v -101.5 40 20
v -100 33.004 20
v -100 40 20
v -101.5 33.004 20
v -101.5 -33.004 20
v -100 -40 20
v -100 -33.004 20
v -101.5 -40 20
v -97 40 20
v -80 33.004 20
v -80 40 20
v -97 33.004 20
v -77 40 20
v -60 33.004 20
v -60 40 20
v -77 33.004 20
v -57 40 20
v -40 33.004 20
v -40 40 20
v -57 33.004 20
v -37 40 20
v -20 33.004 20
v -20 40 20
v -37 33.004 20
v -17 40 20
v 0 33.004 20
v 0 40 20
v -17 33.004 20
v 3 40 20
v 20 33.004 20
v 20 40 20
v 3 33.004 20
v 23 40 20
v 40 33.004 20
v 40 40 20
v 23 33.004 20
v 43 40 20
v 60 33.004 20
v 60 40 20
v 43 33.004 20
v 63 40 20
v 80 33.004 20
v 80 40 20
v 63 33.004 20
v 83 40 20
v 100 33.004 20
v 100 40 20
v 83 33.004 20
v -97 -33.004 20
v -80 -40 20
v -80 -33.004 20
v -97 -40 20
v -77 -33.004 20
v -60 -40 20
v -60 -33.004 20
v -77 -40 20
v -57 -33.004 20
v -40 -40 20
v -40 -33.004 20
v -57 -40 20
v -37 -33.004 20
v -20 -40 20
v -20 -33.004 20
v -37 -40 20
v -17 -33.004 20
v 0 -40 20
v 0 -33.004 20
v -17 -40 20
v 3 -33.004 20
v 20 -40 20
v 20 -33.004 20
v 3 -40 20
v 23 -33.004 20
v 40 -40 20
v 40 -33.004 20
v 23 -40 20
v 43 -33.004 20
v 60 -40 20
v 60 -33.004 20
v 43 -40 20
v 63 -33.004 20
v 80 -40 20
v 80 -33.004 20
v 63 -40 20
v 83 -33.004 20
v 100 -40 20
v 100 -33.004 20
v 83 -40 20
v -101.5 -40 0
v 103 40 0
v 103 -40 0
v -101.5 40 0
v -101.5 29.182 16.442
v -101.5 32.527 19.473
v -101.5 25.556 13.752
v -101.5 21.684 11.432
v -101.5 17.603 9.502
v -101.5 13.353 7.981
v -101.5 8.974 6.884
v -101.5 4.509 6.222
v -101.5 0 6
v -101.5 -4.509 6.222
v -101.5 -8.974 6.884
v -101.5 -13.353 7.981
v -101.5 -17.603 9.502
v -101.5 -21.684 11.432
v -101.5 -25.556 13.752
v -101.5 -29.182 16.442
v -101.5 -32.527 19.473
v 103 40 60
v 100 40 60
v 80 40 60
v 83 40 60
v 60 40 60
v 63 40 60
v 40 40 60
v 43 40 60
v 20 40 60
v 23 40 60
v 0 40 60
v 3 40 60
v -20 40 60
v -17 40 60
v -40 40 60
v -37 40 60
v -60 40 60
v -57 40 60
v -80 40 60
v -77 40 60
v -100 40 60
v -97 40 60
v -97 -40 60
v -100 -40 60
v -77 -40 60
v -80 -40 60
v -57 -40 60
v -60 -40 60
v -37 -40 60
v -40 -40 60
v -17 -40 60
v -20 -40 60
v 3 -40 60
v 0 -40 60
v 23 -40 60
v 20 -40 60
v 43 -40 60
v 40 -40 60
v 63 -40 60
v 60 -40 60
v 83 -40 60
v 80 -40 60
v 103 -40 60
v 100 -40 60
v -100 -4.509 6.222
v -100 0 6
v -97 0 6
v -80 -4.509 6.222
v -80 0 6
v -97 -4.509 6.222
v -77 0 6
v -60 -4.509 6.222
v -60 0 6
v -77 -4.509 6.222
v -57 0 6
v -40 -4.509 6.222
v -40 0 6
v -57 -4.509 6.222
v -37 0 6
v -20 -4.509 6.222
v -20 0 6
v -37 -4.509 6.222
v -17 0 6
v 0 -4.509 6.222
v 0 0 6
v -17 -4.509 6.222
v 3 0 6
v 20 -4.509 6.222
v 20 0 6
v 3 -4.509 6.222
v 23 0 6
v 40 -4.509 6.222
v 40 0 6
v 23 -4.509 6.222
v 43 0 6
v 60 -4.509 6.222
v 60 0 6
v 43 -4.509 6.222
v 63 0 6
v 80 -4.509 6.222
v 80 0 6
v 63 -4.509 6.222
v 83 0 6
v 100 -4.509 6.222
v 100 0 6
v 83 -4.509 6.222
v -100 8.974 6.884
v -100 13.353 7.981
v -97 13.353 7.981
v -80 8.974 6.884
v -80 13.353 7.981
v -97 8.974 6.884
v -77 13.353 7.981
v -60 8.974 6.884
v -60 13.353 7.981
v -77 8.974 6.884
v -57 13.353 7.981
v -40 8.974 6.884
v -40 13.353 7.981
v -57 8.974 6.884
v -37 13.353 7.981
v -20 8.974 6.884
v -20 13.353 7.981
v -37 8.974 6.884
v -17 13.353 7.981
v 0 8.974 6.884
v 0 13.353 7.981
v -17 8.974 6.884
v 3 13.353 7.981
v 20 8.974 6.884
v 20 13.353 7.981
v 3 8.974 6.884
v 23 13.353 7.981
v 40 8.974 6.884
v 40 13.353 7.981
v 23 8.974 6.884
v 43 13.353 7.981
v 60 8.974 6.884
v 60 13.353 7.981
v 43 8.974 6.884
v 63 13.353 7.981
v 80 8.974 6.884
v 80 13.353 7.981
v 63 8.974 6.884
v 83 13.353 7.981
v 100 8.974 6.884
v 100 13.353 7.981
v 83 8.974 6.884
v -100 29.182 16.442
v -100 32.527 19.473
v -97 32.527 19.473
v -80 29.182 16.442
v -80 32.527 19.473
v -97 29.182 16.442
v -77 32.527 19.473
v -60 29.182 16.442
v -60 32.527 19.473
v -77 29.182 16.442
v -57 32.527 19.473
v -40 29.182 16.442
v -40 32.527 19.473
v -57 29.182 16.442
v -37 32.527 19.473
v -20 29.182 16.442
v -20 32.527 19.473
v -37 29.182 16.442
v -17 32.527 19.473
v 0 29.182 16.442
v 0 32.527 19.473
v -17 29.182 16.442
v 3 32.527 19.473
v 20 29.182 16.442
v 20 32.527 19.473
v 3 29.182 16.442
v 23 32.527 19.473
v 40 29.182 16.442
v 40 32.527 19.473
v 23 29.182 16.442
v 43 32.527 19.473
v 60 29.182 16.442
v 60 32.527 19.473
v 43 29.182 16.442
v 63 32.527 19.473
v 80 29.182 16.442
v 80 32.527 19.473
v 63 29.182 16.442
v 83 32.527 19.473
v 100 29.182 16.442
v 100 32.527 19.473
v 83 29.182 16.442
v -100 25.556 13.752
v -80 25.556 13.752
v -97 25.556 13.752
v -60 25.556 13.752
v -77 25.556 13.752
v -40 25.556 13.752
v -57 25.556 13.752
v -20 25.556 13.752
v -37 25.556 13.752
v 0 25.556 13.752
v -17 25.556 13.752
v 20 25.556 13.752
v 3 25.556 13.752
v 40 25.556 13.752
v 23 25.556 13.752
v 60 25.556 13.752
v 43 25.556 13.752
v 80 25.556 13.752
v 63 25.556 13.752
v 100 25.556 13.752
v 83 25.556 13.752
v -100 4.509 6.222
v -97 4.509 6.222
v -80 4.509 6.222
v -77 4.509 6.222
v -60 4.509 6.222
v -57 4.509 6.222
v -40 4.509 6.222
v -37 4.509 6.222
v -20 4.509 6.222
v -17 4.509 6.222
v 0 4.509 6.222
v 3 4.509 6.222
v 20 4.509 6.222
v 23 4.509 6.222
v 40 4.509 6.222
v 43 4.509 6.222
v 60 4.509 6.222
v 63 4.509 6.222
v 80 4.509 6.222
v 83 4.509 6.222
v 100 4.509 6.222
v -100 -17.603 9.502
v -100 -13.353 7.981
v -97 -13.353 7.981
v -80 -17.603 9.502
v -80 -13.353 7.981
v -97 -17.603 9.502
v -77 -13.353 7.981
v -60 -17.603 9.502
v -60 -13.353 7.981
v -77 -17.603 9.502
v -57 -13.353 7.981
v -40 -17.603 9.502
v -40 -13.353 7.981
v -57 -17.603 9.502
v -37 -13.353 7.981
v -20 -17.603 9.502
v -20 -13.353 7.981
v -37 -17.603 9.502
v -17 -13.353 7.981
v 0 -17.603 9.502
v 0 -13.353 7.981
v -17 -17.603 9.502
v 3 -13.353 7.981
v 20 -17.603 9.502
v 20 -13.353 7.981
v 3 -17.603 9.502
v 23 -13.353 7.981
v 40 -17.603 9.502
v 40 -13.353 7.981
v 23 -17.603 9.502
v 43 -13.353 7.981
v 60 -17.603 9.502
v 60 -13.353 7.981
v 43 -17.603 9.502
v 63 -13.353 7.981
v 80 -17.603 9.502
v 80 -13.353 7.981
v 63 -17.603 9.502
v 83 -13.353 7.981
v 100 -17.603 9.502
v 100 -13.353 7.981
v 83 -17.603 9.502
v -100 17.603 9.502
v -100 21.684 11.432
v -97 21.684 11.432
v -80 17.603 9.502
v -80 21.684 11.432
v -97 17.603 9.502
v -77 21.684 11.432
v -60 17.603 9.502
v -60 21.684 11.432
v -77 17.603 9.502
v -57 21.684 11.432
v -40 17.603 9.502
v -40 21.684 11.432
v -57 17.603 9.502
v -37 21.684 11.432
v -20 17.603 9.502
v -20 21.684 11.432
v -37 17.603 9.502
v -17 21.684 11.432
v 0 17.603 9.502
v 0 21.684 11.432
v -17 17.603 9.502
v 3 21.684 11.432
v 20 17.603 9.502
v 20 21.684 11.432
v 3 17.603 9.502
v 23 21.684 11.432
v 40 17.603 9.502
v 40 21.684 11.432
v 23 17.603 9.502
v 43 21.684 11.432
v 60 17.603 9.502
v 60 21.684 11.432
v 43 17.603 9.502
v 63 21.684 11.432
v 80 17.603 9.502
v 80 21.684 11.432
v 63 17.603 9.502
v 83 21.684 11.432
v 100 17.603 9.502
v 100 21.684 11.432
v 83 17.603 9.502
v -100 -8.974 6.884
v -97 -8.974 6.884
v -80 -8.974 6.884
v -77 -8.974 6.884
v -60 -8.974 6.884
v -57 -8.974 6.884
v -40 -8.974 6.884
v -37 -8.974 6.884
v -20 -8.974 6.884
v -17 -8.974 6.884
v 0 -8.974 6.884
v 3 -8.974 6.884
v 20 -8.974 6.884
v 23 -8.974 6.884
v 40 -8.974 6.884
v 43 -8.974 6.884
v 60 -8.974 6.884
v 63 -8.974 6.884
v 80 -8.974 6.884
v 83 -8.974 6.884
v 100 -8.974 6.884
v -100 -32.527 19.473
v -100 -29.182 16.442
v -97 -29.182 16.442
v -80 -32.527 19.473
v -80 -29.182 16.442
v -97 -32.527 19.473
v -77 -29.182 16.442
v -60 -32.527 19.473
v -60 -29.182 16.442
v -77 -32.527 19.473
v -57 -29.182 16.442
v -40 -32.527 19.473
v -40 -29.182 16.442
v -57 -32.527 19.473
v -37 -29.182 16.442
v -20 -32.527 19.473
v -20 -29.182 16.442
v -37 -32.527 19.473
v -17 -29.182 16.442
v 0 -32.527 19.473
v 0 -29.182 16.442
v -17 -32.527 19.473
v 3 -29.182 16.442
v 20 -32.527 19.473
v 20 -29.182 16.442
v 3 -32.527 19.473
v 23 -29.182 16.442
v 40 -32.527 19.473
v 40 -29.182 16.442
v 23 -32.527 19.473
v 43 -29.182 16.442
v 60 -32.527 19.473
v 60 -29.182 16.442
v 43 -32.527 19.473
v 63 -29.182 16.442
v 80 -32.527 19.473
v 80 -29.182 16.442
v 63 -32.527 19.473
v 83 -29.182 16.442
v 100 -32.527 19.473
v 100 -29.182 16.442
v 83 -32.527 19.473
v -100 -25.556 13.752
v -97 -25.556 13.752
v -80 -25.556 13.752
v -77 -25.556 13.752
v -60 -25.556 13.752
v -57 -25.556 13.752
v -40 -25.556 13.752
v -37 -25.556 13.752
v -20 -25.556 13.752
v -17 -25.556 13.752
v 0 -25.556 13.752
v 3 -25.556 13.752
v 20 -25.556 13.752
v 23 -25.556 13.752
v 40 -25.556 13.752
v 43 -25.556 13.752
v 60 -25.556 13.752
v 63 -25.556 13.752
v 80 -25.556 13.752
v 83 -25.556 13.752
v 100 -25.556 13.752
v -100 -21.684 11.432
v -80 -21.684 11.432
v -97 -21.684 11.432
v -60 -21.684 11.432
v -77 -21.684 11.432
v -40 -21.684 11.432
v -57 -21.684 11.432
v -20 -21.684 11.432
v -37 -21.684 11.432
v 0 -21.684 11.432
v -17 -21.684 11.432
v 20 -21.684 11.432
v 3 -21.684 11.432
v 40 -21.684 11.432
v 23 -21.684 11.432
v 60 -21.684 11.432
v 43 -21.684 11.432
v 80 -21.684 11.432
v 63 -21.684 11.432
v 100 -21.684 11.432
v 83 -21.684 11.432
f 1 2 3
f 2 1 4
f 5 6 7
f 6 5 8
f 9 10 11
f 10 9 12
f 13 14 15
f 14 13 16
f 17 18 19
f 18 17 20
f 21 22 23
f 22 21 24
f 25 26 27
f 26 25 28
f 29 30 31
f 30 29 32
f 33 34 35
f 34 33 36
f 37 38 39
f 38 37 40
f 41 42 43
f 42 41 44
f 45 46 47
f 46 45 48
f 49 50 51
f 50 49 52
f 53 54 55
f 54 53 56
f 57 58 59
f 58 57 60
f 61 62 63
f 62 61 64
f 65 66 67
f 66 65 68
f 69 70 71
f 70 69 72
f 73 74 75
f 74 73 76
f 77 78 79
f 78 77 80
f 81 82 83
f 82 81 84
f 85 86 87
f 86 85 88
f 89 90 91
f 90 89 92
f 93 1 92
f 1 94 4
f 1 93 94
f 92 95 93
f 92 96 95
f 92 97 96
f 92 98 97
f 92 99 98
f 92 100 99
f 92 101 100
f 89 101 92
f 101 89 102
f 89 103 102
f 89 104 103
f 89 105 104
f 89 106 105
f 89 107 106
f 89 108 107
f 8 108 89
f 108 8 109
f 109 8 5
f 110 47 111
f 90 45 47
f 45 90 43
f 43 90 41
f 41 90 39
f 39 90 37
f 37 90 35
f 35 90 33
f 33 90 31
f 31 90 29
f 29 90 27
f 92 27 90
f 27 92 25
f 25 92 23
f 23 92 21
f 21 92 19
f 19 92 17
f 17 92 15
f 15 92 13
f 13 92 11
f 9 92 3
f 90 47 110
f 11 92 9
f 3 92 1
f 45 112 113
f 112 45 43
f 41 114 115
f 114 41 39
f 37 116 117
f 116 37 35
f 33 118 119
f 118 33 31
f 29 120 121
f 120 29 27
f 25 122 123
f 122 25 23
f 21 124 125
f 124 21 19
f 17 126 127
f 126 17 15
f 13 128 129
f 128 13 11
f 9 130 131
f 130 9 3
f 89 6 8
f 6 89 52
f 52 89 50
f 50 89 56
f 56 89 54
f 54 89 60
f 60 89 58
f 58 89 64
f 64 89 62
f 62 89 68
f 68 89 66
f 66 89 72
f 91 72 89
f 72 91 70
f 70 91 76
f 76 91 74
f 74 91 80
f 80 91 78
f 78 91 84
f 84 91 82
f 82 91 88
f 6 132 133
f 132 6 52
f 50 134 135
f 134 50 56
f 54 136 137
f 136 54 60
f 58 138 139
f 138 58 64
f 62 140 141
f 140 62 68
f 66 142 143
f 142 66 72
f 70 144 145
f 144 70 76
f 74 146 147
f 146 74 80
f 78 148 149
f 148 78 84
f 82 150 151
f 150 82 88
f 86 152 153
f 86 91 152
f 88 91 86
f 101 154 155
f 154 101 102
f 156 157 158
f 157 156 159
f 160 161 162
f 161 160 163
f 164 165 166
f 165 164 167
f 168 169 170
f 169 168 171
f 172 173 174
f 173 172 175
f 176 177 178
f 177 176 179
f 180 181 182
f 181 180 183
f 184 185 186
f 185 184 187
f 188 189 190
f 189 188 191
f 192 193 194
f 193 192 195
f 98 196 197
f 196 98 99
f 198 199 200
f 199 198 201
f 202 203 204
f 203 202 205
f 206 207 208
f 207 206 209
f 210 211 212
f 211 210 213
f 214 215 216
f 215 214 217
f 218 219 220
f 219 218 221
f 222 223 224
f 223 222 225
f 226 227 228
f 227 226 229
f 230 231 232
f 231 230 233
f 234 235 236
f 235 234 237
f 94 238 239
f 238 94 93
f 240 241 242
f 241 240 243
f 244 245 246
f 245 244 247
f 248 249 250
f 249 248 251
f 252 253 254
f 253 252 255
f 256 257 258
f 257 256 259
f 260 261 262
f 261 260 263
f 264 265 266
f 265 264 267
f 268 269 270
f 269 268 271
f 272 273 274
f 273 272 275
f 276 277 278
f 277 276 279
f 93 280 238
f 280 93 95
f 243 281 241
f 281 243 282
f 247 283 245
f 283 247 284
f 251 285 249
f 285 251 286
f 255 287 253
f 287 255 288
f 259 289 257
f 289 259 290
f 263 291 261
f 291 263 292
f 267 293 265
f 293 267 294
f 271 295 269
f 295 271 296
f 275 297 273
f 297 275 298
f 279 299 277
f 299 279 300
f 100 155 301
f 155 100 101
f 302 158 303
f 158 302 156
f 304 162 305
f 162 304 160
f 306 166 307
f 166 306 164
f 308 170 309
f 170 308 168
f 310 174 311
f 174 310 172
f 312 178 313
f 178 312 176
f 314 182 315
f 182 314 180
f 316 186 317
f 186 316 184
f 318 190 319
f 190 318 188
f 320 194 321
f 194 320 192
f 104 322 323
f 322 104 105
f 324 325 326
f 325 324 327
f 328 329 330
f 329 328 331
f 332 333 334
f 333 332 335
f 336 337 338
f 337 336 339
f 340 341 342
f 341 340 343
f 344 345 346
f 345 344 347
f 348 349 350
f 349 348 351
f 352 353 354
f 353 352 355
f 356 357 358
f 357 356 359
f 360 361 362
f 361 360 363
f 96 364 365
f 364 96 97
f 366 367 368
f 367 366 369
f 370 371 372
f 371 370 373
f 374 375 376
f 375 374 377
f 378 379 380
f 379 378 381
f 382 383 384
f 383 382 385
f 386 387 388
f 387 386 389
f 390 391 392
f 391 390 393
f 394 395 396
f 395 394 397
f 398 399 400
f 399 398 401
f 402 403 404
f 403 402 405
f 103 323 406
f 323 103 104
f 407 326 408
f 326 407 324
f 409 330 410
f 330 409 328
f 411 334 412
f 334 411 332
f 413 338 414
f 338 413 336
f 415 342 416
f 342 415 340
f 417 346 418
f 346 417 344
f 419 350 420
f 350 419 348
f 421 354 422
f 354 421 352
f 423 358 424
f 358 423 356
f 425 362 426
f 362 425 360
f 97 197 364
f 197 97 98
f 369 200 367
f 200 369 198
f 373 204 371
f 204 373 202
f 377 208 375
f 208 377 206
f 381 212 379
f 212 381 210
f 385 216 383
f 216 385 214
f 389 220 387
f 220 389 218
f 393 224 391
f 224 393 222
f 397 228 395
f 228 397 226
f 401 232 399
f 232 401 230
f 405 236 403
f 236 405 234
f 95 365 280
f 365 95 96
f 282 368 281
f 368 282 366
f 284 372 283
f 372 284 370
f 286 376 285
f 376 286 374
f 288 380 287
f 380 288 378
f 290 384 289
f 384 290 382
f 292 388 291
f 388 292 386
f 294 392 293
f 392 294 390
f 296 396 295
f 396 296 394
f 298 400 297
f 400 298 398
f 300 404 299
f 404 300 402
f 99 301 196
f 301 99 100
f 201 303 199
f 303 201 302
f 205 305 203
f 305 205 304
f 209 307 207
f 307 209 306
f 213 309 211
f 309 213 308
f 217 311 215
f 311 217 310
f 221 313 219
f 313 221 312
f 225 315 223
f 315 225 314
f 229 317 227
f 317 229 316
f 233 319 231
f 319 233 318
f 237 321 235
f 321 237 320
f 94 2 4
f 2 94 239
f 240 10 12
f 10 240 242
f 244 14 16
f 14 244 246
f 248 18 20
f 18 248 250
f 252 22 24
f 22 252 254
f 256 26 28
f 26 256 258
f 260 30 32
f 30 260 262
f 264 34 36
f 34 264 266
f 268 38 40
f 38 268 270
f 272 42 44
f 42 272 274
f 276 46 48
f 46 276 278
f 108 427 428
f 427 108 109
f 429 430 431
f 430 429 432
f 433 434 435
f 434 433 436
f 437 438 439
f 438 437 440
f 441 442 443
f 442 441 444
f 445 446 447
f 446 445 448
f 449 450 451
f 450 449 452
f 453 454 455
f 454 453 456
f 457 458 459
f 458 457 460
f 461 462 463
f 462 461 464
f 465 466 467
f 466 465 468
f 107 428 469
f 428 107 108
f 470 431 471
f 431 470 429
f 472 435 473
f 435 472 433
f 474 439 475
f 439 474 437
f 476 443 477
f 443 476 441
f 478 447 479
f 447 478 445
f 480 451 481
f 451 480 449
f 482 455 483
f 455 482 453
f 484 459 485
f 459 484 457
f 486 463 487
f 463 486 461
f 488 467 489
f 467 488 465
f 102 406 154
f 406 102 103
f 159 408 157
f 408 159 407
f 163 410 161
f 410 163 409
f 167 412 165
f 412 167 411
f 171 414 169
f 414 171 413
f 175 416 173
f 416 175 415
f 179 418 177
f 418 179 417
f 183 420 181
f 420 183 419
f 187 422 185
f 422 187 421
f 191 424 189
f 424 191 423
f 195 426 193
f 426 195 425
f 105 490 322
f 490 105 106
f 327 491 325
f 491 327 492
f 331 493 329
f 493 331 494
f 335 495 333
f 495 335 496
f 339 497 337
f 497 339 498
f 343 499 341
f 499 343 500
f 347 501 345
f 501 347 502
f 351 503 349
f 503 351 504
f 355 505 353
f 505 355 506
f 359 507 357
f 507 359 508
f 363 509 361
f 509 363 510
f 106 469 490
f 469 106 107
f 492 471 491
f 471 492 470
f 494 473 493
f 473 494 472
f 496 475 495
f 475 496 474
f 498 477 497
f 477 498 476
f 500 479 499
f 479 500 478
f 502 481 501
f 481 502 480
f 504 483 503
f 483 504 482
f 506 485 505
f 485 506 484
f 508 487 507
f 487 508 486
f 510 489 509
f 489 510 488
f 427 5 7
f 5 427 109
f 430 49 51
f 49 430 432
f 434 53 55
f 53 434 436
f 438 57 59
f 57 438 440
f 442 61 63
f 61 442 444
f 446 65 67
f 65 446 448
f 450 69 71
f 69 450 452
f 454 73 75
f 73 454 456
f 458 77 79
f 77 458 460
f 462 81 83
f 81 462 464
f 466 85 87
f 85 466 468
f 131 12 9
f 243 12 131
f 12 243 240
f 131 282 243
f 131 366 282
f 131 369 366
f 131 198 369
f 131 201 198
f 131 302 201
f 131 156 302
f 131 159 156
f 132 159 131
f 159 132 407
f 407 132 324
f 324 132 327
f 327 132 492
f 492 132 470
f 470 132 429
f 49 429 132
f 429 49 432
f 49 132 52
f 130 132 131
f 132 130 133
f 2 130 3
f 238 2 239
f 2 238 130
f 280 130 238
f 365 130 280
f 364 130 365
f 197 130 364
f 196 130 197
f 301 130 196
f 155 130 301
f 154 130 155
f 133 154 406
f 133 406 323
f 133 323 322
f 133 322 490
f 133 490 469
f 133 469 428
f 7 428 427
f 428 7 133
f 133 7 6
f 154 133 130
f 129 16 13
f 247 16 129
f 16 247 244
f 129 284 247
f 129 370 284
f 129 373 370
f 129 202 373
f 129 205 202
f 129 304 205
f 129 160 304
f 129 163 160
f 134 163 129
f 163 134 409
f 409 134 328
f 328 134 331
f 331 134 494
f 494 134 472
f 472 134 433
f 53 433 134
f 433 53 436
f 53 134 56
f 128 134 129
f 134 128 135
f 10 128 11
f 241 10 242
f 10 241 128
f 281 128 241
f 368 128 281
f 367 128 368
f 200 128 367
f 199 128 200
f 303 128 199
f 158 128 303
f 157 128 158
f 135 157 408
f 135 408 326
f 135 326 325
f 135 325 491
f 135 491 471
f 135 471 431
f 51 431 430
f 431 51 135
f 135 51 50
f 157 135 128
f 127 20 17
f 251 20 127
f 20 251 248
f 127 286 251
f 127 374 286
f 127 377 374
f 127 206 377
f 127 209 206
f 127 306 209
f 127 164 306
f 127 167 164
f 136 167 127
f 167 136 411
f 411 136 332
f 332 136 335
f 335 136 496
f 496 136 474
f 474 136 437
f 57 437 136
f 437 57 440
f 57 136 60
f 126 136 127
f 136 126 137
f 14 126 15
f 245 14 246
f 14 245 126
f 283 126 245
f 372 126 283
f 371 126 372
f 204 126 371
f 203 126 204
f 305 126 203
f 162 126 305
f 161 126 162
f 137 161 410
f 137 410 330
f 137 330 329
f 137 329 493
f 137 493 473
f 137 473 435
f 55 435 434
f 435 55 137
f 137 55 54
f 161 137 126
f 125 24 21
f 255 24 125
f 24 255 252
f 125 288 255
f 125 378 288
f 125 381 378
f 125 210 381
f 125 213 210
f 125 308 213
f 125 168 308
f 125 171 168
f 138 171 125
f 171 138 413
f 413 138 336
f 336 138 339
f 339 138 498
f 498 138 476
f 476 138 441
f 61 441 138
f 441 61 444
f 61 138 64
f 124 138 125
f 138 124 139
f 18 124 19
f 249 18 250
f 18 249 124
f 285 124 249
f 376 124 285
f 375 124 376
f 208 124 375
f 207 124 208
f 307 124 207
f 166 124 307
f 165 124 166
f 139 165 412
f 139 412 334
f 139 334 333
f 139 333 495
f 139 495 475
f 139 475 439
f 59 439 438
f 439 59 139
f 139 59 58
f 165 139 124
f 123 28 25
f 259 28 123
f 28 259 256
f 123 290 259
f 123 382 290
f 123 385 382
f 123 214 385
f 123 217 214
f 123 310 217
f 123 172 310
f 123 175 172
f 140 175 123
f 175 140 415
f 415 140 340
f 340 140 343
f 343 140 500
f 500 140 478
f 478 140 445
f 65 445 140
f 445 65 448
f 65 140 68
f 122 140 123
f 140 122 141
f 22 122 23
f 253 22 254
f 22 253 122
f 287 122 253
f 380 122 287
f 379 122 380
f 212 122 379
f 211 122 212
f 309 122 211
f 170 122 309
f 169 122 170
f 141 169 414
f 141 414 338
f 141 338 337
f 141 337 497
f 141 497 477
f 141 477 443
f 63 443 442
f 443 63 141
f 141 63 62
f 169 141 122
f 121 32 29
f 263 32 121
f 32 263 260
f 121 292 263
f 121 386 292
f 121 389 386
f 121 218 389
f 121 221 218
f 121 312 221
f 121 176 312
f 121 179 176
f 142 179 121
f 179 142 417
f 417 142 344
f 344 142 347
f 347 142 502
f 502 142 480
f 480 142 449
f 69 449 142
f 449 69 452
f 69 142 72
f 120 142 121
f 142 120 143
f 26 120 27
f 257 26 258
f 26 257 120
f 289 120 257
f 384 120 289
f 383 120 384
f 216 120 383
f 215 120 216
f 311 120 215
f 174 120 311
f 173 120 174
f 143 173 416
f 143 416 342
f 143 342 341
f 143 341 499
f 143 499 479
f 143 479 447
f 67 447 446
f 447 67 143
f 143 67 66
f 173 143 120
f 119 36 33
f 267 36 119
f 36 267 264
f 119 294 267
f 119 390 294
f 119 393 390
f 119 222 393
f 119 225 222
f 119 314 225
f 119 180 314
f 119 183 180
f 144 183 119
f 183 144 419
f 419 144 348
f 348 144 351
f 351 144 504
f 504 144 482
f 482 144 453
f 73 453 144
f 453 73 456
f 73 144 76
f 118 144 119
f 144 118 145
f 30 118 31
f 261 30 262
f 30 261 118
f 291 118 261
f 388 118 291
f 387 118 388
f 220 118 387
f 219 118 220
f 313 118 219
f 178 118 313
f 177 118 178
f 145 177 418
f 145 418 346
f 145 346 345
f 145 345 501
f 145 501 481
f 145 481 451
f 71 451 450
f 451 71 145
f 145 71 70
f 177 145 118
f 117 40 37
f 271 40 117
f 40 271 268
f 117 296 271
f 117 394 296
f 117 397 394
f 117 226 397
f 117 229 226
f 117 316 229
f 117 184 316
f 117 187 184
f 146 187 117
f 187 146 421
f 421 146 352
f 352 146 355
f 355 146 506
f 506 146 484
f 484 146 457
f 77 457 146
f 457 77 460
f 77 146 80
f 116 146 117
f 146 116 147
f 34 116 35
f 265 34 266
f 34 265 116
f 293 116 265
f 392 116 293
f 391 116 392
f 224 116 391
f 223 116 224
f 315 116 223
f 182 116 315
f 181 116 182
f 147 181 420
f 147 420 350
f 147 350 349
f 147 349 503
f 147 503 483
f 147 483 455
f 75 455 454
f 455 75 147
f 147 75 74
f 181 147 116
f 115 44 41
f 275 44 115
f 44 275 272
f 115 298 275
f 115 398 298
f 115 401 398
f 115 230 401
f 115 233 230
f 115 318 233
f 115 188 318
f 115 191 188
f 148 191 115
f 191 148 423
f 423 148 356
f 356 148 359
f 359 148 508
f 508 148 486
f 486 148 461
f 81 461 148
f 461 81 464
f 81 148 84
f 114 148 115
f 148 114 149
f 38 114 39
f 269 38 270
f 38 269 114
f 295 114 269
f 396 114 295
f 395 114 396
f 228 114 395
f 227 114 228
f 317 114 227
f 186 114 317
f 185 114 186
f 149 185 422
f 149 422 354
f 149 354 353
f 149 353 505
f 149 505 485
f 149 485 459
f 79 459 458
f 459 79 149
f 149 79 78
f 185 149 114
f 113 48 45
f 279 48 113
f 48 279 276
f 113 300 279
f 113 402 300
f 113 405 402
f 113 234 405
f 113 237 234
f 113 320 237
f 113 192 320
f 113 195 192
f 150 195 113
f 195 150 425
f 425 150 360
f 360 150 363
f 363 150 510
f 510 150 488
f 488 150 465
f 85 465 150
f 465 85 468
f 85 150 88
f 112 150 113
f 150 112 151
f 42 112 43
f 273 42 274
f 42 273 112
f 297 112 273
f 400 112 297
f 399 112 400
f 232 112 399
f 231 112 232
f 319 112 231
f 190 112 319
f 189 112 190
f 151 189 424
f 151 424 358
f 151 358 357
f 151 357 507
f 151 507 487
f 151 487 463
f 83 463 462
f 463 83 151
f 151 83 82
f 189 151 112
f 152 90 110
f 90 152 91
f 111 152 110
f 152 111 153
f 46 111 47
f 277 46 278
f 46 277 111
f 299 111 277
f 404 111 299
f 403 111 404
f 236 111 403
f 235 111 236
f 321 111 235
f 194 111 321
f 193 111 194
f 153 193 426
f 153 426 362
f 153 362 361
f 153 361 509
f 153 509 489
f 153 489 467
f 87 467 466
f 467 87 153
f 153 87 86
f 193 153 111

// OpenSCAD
// --- Parameters ---
// Base dimensions
base_length = 203;       // X dimension of the base
base_width = 80;         // Y dimension of the base
base_height = 20;        // Z dimension of the base

// Cradle dimensions (for 90mm Petri dish)
dish_radius = 46;        // Radius of the cylinder cutting the cradle
cradle_axis_y = 0;       // Y position of the cylinder axis
cradle_axis_z = 52;      // Z position of the cylinder axis

// Divider dimensions
num_dividers = 11;       // Number of vertical plates
divider_thickness = 3;   // Thickness of each divider (X direction)
divider_height = 60;     // Height of dividers (Z direction)
divider_width = 80;      // Width of dividers (Y direction)
divider_spacing = 20;    // Distance between divider centers (X direction)
divider_start_x = -100;  // Starting X position for the first divider

// Resolution
fn_val = 64;             // Smoothness for cylinders

// --- Implementation ---

// The goal is to create a base with a cradle cut out, 
// and then add dividers that are NOT cut by the cradle.
// This ensures the dividers remain solid blocks from Z=0 to Z=60,
// effectively acting as the walls of the slots without being 
// hollowed out by the cradle.

union() {
    // 1. The Base with the Cradle Cutout
    // We perform the subtraction on the base first.
    difference() {
        // The Base Block
        translate([-base_length/2, -base_width/2, 0])
            cube([base_length, base_width, base_height]);
        
        // The Cradle (Cylinder)
        // We extend the cylinder length to ensure a clean cut through the base.
        translate([0, cradle_axis_y, cradle_axis_z])
            rotate([0, 90, 0])
                cylinder(h = base_length + 2, r = dish_radius, center = true, $fn = fn_val);
    }

    // 2. The Divider Plates
    // These are added via union, so they are not affected by the cradle subtraction.
    // They rise from Z=0 to Z=60.
    for (i = [0 : num_dividers - 1]) {
        translate([divider_start_x + (i * divider_spacing), -divider_width/2, 0])
            cube([divider_thickness, divider_width, divider_height]);
    }
}

// Note on the logic:
// The prompt specifies: "the cradle is not cut through them [the dividers]".
// By using union() { (Base - Cradle); Dividers; }, the dividers are added 
// as solid volumes. Where a divider intersects the cradle's void, 
// the divider's volume takes precedence, making it "solid" at that location.
// This creates the 17mm wide slots between the dividers.
